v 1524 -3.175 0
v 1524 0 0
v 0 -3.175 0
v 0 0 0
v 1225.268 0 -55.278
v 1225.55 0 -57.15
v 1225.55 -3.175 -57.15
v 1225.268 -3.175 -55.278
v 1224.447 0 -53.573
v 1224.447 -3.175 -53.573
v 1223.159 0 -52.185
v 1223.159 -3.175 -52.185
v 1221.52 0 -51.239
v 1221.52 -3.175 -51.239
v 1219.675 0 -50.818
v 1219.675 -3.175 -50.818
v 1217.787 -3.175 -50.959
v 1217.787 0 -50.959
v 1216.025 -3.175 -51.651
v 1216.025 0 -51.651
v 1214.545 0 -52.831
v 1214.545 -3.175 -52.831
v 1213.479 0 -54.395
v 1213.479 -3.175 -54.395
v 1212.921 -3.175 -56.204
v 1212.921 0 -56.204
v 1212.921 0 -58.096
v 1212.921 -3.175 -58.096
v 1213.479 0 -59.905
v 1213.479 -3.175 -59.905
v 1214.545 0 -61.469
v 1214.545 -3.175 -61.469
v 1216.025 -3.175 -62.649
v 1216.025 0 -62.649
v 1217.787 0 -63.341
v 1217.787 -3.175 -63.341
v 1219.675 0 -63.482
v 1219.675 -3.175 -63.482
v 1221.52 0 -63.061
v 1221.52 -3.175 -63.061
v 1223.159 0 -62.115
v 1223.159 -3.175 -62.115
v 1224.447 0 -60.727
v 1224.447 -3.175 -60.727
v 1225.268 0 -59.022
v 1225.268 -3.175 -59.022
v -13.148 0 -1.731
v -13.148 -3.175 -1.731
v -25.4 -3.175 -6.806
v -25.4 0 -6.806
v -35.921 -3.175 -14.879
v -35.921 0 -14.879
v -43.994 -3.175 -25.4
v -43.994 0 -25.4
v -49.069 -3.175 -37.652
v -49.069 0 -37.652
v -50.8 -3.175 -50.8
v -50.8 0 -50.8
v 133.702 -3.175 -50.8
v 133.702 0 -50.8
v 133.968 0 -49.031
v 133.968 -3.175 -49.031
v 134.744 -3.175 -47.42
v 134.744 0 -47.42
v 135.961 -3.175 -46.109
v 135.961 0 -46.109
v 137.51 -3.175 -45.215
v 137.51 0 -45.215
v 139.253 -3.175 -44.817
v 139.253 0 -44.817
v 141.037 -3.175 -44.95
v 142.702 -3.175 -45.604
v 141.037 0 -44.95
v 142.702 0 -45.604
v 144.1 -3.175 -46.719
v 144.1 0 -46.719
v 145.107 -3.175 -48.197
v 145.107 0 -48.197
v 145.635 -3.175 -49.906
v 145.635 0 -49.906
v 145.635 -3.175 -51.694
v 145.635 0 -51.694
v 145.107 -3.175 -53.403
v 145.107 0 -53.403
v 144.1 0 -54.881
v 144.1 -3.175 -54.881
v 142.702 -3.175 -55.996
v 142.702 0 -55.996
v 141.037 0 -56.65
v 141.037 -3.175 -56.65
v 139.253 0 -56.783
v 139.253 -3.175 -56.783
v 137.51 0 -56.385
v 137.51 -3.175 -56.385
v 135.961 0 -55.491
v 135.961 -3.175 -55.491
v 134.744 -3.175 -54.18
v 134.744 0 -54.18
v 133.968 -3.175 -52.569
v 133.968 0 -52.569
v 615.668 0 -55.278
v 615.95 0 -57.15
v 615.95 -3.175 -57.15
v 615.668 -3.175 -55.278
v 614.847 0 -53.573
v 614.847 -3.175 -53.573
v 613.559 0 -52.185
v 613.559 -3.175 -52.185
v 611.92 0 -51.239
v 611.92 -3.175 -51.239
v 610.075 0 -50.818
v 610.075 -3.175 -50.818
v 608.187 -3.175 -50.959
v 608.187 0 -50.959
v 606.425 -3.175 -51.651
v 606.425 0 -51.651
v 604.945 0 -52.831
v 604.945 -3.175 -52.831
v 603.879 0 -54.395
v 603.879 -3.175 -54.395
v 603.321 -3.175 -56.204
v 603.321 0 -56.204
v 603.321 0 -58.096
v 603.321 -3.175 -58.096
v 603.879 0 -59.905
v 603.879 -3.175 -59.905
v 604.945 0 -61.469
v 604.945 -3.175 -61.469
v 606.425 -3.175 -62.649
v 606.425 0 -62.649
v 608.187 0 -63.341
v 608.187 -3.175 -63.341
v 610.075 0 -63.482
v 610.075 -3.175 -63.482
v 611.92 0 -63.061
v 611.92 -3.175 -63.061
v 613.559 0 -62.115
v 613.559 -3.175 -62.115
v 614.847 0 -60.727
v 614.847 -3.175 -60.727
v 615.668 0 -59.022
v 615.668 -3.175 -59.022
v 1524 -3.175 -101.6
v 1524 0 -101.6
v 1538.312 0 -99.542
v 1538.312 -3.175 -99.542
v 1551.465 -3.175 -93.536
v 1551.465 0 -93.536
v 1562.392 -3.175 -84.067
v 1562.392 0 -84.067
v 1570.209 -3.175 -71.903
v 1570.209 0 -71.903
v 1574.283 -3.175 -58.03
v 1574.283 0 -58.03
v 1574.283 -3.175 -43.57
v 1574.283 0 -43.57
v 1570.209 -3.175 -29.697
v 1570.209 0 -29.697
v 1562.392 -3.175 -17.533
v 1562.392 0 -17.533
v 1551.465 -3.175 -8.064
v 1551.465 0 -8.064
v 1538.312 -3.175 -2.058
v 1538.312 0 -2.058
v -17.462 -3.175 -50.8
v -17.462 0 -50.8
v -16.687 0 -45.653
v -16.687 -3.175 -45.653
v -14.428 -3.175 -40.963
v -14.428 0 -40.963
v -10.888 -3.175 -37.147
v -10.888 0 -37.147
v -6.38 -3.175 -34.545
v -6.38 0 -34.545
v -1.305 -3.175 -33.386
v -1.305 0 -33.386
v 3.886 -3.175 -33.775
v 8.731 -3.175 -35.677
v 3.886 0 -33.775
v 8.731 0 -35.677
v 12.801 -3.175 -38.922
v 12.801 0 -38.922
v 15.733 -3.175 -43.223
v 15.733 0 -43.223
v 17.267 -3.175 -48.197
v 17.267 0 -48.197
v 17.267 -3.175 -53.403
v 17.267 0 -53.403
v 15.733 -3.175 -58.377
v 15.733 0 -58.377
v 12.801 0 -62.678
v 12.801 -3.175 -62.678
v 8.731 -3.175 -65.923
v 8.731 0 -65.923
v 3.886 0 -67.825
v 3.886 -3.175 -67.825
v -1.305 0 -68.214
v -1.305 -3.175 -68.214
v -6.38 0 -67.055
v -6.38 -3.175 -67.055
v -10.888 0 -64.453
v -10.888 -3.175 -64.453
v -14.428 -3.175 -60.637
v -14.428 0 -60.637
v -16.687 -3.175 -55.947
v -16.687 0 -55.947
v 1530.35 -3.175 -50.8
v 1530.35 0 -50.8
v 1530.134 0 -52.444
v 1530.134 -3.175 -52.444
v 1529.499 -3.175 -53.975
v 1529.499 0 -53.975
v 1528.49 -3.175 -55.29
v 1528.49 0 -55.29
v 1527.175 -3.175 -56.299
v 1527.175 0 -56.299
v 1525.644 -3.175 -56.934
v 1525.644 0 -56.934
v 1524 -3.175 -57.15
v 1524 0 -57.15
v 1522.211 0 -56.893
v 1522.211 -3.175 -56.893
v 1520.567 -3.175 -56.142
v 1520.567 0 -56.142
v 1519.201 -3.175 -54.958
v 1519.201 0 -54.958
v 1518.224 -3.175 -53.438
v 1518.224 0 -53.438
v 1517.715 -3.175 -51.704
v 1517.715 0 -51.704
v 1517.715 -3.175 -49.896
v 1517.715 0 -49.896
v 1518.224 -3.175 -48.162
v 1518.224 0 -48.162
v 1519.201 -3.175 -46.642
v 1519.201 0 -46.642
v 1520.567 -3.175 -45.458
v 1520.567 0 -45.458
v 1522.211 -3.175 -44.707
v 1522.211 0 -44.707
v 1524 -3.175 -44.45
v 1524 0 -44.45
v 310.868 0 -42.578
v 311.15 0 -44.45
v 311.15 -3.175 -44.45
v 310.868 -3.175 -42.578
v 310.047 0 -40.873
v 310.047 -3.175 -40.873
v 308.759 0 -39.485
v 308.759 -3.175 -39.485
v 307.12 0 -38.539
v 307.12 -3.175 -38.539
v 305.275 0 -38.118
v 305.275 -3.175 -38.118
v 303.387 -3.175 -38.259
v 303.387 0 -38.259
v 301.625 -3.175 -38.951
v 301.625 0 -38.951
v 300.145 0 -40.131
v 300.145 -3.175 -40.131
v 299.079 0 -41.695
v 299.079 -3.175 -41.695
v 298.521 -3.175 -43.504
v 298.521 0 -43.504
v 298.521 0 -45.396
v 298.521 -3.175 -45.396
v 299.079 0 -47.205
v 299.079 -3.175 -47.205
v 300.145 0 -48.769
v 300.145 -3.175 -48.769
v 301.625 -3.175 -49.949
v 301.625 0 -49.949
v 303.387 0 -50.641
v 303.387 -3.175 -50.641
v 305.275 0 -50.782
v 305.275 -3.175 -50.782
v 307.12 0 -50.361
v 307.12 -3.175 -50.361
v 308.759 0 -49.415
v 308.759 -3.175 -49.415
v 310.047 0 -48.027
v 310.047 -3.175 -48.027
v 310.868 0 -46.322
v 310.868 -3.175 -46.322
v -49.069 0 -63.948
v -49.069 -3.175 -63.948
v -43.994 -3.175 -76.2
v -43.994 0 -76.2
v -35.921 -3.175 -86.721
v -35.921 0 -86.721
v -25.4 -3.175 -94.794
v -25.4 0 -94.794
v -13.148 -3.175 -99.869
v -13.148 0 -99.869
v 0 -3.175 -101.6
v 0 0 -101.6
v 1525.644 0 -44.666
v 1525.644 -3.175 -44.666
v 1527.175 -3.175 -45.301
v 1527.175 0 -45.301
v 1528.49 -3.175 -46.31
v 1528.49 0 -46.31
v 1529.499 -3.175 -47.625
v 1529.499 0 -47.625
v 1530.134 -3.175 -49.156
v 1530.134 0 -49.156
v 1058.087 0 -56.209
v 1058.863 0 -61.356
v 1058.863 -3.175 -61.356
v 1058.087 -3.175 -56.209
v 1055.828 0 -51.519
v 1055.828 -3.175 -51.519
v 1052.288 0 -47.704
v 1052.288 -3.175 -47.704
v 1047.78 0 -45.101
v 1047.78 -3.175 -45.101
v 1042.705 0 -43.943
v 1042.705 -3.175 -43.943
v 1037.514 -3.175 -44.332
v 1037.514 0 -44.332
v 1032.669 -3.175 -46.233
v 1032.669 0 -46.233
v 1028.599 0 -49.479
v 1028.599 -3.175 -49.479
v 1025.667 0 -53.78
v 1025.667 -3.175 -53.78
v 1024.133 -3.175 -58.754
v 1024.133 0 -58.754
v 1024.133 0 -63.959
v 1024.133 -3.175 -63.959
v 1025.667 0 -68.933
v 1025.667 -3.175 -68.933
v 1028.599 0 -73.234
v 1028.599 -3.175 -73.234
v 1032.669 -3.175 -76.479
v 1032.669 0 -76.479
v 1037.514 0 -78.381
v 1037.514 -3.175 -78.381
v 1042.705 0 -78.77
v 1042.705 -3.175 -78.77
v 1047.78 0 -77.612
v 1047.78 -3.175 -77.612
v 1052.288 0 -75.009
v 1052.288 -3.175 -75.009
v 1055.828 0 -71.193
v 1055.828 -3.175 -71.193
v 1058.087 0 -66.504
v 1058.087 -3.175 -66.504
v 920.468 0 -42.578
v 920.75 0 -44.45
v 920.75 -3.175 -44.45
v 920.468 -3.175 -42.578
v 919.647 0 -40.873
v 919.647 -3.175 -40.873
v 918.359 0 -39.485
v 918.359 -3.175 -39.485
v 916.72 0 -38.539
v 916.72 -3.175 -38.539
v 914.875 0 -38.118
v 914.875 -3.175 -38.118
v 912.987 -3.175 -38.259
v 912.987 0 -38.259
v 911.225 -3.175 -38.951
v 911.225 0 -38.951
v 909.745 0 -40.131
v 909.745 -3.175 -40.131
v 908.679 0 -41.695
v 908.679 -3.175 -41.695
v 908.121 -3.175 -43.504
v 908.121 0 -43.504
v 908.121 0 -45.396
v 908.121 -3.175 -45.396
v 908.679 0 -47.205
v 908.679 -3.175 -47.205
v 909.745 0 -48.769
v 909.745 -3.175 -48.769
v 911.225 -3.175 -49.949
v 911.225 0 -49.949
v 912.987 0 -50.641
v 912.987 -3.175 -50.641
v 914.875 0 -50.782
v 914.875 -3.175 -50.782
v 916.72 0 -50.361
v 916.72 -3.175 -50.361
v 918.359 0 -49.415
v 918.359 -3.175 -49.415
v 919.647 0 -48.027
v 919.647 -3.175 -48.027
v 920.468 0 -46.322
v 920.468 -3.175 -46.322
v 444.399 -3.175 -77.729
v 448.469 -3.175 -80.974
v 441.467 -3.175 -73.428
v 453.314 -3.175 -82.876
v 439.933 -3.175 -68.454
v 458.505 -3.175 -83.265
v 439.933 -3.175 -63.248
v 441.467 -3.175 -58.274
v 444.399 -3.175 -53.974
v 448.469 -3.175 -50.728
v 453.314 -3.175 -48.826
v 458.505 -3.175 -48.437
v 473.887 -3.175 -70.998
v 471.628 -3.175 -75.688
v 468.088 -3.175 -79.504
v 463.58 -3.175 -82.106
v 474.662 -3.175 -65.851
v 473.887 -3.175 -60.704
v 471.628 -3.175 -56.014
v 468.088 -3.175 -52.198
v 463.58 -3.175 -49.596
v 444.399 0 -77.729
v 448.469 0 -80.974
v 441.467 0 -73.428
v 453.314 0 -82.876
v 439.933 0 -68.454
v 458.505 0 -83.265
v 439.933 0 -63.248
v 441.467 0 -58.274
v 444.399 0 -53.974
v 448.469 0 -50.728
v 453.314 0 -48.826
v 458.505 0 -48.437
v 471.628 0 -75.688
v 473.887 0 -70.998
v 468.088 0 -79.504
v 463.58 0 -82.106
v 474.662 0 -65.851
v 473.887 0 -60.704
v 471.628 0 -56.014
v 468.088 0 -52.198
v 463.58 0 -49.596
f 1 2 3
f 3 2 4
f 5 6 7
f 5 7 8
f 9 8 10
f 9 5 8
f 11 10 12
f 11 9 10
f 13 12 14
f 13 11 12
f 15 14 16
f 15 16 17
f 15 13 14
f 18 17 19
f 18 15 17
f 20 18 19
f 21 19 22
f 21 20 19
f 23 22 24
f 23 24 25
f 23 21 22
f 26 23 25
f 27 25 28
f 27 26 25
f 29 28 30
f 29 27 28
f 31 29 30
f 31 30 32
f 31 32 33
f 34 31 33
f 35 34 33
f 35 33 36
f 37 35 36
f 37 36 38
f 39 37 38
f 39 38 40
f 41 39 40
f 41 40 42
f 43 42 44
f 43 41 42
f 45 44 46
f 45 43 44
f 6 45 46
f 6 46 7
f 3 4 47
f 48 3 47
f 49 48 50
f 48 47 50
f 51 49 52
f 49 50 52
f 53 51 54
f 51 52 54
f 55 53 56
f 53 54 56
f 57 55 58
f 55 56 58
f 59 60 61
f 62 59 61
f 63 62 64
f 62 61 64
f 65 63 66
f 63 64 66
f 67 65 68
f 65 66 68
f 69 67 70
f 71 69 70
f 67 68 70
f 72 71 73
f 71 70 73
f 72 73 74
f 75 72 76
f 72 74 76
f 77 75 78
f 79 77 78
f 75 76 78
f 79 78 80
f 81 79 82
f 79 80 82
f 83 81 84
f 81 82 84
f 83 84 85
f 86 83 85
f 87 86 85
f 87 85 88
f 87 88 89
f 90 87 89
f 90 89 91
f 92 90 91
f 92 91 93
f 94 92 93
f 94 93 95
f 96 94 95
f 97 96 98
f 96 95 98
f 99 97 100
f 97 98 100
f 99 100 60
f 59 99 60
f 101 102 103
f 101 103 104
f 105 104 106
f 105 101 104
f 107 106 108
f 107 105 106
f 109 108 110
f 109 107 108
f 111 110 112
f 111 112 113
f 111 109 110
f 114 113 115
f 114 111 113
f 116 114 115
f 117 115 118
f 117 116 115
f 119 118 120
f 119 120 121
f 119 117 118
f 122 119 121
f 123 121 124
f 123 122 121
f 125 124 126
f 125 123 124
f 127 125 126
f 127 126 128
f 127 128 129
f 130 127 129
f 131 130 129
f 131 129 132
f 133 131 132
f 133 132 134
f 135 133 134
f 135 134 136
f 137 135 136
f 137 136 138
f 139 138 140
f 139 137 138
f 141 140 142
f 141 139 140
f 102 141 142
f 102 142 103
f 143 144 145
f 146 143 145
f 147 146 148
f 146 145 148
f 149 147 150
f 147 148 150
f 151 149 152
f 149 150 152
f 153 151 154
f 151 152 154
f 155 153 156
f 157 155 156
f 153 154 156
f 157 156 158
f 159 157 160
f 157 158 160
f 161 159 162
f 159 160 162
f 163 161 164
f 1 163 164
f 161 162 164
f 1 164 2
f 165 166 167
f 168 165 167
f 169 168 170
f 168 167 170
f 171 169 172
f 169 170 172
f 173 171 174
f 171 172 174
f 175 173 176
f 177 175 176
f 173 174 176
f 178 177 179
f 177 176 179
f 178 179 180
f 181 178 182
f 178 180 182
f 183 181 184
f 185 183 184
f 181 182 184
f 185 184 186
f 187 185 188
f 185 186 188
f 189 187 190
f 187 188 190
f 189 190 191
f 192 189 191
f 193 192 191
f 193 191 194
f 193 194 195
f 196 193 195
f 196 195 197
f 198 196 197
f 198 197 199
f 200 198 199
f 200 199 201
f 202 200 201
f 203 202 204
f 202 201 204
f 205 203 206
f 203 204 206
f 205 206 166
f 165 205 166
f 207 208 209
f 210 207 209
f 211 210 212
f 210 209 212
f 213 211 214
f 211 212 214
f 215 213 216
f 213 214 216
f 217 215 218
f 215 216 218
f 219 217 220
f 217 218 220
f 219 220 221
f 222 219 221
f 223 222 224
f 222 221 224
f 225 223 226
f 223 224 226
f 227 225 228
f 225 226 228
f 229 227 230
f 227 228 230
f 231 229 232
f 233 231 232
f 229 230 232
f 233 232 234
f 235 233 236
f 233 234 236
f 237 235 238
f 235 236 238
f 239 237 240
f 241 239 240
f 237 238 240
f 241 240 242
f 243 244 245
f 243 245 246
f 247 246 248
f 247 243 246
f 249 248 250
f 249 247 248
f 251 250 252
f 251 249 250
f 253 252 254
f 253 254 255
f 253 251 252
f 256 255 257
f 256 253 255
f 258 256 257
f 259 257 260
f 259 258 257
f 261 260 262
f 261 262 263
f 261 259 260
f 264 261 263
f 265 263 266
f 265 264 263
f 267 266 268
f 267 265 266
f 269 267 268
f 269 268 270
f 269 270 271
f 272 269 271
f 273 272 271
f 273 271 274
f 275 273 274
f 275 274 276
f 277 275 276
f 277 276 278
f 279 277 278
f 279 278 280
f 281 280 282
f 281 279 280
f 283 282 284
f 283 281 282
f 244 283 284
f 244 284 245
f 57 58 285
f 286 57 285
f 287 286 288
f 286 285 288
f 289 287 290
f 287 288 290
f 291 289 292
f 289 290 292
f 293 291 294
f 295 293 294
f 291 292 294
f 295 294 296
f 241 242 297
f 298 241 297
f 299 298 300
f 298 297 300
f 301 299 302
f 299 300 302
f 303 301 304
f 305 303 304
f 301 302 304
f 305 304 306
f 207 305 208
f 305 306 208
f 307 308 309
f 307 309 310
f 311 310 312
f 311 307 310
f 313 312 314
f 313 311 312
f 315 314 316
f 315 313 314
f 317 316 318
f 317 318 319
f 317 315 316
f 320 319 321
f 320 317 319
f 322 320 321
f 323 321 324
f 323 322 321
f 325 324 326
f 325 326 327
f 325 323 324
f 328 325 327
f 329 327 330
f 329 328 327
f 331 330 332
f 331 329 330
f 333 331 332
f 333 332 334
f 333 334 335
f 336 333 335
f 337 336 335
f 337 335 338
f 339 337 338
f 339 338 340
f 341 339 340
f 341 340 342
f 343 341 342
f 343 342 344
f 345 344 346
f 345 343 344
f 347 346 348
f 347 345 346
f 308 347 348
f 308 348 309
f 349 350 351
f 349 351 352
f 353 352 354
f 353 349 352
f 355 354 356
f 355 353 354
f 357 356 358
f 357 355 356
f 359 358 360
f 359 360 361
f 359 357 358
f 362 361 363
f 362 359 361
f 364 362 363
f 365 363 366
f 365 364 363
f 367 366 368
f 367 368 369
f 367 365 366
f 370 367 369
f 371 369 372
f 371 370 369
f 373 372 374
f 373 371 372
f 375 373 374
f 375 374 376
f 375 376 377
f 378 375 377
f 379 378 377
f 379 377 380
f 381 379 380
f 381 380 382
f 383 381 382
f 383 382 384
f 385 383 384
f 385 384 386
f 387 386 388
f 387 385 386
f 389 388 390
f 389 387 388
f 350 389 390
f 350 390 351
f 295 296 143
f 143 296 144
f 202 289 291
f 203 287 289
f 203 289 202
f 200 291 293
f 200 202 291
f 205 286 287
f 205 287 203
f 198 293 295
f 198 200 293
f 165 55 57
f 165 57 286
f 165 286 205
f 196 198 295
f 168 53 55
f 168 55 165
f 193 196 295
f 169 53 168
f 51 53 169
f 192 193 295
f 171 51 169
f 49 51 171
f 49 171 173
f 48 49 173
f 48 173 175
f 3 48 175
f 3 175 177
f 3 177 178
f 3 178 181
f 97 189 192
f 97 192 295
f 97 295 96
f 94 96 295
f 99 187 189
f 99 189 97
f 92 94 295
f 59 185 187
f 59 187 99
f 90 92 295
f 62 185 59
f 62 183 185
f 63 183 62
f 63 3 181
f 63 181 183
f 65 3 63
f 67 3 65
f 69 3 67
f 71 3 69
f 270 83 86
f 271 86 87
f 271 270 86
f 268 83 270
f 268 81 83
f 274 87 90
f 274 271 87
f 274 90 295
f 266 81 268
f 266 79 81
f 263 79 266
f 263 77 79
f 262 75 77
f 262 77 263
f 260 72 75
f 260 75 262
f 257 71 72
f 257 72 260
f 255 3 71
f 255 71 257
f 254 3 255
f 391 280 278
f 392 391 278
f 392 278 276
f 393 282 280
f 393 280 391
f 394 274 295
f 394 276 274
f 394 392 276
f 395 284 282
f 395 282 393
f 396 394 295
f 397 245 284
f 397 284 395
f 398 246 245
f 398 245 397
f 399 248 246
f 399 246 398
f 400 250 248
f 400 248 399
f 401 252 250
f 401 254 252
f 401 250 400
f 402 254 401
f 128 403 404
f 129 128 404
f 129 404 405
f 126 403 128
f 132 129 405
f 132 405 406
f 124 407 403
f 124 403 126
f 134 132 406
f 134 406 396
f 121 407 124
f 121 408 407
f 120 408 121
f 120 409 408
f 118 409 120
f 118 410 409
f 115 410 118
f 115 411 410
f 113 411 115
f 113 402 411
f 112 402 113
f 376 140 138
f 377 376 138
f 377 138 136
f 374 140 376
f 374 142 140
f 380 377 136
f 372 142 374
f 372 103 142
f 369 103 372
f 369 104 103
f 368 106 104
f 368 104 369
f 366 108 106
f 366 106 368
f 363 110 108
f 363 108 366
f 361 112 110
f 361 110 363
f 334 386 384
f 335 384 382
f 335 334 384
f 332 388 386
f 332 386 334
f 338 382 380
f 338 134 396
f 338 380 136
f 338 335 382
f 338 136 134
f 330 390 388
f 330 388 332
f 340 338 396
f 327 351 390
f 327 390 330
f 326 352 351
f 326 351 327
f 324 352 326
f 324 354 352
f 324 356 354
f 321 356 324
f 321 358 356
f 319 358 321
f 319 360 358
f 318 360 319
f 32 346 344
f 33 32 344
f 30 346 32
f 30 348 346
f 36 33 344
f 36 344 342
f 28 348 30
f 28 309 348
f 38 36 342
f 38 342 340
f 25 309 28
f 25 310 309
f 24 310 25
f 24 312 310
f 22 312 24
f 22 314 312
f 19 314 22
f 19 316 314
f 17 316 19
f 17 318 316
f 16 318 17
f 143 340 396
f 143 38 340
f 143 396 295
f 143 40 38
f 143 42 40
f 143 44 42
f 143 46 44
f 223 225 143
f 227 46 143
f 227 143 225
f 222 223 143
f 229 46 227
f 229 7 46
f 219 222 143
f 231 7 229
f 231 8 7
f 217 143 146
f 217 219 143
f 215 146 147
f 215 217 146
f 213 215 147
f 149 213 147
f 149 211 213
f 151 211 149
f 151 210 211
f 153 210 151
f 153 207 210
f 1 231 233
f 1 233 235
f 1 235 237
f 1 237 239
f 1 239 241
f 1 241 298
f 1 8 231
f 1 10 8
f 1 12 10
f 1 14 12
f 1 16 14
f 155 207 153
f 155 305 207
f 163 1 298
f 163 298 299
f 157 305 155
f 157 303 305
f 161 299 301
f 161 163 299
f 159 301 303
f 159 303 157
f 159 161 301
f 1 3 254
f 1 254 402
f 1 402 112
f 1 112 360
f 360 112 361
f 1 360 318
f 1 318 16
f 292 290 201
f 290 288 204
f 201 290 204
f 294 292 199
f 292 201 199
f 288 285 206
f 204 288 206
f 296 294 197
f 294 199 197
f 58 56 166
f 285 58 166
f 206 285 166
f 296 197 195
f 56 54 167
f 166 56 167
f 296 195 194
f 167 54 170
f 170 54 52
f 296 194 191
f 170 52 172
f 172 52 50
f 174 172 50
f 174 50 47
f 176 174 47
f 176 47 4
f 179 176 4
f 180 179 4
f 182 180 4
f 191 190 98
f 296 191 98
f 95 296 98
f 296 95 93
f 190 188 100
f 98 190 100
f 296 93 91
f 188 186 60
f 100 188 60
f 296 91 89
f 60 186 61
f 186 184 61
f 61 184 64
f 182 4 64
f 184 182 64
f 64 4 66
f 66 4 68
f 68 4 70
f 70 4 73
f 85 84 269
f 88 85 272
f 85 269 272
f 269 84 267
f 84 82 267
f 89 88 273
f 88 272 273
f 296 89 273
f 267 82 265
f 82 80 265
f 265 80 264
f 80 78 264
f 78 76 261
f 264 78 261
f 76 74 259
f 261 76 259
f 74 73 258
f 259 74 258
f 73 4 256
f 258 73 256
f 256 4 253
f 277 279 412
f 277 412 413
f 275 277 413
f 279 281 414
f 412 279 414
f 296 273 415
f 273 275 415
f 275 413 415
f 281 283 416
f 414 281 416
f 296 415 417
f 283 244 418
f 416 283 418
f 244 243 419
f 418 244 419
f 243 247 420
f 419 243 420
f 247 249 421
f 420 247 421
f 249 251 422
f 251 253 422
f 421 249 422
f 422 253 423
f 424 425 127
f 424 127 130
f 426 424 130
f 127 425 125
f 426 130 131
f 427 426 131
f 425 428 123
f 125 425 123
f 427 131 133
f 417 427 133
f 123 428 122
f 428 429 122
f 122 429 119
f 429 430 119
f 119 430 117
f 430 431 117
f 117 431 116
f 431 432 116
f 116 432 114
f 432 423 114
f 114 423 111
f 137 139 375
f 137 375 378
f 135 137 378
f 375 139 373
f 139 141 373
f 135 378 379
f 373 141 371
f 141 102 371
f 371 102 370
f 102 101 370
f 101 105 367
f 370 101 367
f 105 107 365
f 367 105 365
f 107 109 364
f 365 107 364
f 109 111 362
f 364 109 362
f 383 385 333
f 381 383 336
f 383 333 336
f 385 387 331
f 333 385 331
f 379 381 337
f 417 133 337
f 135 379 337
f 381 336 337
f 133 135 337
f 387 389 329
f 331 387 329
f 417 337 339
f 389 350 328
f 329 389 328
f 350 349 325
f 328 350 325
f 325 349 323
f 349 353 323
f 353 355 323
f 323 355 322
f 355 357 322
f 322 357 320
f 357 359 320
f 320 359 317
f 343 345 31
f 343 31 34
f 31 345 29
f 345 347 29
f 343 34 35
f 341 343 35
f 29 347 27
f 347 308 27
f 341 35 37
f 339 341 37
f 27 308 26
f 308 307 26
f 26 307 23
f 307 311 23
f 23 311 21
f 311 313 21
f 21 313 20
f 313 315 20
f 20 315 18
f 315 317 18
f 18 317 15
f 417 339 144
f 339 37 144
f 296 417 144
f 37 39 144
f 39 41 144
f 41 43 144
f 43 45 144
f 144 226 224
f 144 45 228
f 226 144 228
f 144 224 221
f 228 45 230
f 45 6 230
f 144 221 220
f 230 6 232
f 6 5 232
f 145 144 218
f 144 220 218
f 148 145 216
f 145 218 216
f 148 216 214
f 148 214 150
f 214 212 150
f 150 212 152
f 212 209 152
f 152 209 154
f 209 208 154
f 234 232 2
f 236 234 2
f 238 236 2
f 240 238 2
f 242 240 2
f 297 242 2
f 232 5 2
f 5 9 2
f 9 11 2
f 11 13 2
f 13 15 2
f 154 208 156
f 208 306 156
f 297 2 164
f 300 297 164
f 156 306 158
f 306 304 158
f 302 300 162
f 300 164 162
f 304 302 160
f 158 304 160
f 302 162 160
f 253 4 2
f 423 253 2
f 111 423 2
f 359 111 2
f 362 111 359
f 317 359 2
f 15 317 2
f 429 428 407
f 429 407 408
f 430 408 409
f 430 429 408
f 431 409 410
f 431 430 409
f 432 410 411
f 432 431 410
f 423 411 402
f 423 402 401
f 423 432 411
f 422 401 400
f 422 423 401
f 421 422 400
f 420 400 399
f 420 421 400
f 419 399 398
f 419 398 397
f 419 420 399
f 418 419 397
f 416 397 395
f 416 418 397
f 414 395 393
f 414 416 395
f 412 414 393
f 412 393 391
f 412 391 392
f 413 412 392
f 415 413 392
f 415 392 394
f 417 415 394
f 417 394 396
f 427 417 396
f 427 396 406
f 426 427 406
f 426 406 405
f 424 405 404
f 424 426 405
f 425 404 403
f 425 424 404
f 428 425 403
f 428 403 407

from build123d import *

# Parameters (mm, degrees)
F0_R     = 17.4625
F0_R_2   = 6.35
F1_DEPTH = 3.175


# Not quite as in the source:
# - a feature names something its author has since deleted; it is built from what else it names


with BuildPart() as f1:
    # F0 (on Front) → F1 (new body)
    with BuildSketch(Plane.XZ):
        with BuildLine():
            Line((0, -101.6), (1524, -101.6))
            Line((1524, -101.6), (1524, -57.15))
            ThreePointArc((1524, -57.15), (1517.65, -50.8), (1524, -44.45))
            Line((1524, -44.45), (1524, 0))
            Line((1524, 0), (0, 0))
            ThreePointArc((0, 0), (-35.9210244843, -14.8789755157), (-50.8, -50.8))
            ThreePointArc((-50.8, -50.8), (-35.9210244843, -86.7210244843), (0, -101.6))
        make_face()
        with BuildLine():
            ThreePointArc((17.4625, -50.8), (0, -68.2625), (-17.4625, -50.8))
            ThreePointArc((-17.4625, -50.8), (0, -33.3375), (17.4625, -50.8))
        make_face(mode=Mode.SUBTRACT)
        with BuildLine():
            ThreePointArc((145.7015722418, -50.8), (139.7015722418, -56.8), (133.7015722418, -50.8))
            ThreePointArc((133.7015722418, -50.8), (139.7015722418, -44.8), (145.7015722418, -50.8))
        make_face(mode=Mode.SUBTRACT)
        with Locations((457.2, -65.8510252833)):
            Circle(F0_R, mode=Mode.SUBTRACT)
        with Locations((609.6, -57.15)):
            Circle(F0_R_2, mode=Mode.SUBTRACT)
        with Locations((1041.4, -61.3564662635)):
            Circle(F0_R, mode=Mode.SUBTRACT)
        with Locations((1219.2, -57.15)):
            Circle(F0_R_2, mode=Mode.SUBTRACT)
        with Locations((304.8, -44.45)):
            Circle(F0_R_2, mode=Mode.SUBTRACT)
        with Locations((914.4, -44.45)):
            Circle(F0_R_2, mode=Mode.SUBTRACT)
        with BuildLine():
            Line((1524, -57.15), (1524, -101.6))
            ThreePointArc((1524, -101.6), (1574.8, -50.8), (1524, 0))
            Line((1524, 0), (1524, -44.45))
            ThreePointArc((1524, -44.45), (1528.4901280605, -46.3098719395), (1530.35, -50.8))
            ThreePointArc((1530.35, -50.8), (1528.4901280605, -55.2901280605), (1524, -57.15))
        make_face()
    extrude(amount=F1_DEPTH)


solid = f1.part
